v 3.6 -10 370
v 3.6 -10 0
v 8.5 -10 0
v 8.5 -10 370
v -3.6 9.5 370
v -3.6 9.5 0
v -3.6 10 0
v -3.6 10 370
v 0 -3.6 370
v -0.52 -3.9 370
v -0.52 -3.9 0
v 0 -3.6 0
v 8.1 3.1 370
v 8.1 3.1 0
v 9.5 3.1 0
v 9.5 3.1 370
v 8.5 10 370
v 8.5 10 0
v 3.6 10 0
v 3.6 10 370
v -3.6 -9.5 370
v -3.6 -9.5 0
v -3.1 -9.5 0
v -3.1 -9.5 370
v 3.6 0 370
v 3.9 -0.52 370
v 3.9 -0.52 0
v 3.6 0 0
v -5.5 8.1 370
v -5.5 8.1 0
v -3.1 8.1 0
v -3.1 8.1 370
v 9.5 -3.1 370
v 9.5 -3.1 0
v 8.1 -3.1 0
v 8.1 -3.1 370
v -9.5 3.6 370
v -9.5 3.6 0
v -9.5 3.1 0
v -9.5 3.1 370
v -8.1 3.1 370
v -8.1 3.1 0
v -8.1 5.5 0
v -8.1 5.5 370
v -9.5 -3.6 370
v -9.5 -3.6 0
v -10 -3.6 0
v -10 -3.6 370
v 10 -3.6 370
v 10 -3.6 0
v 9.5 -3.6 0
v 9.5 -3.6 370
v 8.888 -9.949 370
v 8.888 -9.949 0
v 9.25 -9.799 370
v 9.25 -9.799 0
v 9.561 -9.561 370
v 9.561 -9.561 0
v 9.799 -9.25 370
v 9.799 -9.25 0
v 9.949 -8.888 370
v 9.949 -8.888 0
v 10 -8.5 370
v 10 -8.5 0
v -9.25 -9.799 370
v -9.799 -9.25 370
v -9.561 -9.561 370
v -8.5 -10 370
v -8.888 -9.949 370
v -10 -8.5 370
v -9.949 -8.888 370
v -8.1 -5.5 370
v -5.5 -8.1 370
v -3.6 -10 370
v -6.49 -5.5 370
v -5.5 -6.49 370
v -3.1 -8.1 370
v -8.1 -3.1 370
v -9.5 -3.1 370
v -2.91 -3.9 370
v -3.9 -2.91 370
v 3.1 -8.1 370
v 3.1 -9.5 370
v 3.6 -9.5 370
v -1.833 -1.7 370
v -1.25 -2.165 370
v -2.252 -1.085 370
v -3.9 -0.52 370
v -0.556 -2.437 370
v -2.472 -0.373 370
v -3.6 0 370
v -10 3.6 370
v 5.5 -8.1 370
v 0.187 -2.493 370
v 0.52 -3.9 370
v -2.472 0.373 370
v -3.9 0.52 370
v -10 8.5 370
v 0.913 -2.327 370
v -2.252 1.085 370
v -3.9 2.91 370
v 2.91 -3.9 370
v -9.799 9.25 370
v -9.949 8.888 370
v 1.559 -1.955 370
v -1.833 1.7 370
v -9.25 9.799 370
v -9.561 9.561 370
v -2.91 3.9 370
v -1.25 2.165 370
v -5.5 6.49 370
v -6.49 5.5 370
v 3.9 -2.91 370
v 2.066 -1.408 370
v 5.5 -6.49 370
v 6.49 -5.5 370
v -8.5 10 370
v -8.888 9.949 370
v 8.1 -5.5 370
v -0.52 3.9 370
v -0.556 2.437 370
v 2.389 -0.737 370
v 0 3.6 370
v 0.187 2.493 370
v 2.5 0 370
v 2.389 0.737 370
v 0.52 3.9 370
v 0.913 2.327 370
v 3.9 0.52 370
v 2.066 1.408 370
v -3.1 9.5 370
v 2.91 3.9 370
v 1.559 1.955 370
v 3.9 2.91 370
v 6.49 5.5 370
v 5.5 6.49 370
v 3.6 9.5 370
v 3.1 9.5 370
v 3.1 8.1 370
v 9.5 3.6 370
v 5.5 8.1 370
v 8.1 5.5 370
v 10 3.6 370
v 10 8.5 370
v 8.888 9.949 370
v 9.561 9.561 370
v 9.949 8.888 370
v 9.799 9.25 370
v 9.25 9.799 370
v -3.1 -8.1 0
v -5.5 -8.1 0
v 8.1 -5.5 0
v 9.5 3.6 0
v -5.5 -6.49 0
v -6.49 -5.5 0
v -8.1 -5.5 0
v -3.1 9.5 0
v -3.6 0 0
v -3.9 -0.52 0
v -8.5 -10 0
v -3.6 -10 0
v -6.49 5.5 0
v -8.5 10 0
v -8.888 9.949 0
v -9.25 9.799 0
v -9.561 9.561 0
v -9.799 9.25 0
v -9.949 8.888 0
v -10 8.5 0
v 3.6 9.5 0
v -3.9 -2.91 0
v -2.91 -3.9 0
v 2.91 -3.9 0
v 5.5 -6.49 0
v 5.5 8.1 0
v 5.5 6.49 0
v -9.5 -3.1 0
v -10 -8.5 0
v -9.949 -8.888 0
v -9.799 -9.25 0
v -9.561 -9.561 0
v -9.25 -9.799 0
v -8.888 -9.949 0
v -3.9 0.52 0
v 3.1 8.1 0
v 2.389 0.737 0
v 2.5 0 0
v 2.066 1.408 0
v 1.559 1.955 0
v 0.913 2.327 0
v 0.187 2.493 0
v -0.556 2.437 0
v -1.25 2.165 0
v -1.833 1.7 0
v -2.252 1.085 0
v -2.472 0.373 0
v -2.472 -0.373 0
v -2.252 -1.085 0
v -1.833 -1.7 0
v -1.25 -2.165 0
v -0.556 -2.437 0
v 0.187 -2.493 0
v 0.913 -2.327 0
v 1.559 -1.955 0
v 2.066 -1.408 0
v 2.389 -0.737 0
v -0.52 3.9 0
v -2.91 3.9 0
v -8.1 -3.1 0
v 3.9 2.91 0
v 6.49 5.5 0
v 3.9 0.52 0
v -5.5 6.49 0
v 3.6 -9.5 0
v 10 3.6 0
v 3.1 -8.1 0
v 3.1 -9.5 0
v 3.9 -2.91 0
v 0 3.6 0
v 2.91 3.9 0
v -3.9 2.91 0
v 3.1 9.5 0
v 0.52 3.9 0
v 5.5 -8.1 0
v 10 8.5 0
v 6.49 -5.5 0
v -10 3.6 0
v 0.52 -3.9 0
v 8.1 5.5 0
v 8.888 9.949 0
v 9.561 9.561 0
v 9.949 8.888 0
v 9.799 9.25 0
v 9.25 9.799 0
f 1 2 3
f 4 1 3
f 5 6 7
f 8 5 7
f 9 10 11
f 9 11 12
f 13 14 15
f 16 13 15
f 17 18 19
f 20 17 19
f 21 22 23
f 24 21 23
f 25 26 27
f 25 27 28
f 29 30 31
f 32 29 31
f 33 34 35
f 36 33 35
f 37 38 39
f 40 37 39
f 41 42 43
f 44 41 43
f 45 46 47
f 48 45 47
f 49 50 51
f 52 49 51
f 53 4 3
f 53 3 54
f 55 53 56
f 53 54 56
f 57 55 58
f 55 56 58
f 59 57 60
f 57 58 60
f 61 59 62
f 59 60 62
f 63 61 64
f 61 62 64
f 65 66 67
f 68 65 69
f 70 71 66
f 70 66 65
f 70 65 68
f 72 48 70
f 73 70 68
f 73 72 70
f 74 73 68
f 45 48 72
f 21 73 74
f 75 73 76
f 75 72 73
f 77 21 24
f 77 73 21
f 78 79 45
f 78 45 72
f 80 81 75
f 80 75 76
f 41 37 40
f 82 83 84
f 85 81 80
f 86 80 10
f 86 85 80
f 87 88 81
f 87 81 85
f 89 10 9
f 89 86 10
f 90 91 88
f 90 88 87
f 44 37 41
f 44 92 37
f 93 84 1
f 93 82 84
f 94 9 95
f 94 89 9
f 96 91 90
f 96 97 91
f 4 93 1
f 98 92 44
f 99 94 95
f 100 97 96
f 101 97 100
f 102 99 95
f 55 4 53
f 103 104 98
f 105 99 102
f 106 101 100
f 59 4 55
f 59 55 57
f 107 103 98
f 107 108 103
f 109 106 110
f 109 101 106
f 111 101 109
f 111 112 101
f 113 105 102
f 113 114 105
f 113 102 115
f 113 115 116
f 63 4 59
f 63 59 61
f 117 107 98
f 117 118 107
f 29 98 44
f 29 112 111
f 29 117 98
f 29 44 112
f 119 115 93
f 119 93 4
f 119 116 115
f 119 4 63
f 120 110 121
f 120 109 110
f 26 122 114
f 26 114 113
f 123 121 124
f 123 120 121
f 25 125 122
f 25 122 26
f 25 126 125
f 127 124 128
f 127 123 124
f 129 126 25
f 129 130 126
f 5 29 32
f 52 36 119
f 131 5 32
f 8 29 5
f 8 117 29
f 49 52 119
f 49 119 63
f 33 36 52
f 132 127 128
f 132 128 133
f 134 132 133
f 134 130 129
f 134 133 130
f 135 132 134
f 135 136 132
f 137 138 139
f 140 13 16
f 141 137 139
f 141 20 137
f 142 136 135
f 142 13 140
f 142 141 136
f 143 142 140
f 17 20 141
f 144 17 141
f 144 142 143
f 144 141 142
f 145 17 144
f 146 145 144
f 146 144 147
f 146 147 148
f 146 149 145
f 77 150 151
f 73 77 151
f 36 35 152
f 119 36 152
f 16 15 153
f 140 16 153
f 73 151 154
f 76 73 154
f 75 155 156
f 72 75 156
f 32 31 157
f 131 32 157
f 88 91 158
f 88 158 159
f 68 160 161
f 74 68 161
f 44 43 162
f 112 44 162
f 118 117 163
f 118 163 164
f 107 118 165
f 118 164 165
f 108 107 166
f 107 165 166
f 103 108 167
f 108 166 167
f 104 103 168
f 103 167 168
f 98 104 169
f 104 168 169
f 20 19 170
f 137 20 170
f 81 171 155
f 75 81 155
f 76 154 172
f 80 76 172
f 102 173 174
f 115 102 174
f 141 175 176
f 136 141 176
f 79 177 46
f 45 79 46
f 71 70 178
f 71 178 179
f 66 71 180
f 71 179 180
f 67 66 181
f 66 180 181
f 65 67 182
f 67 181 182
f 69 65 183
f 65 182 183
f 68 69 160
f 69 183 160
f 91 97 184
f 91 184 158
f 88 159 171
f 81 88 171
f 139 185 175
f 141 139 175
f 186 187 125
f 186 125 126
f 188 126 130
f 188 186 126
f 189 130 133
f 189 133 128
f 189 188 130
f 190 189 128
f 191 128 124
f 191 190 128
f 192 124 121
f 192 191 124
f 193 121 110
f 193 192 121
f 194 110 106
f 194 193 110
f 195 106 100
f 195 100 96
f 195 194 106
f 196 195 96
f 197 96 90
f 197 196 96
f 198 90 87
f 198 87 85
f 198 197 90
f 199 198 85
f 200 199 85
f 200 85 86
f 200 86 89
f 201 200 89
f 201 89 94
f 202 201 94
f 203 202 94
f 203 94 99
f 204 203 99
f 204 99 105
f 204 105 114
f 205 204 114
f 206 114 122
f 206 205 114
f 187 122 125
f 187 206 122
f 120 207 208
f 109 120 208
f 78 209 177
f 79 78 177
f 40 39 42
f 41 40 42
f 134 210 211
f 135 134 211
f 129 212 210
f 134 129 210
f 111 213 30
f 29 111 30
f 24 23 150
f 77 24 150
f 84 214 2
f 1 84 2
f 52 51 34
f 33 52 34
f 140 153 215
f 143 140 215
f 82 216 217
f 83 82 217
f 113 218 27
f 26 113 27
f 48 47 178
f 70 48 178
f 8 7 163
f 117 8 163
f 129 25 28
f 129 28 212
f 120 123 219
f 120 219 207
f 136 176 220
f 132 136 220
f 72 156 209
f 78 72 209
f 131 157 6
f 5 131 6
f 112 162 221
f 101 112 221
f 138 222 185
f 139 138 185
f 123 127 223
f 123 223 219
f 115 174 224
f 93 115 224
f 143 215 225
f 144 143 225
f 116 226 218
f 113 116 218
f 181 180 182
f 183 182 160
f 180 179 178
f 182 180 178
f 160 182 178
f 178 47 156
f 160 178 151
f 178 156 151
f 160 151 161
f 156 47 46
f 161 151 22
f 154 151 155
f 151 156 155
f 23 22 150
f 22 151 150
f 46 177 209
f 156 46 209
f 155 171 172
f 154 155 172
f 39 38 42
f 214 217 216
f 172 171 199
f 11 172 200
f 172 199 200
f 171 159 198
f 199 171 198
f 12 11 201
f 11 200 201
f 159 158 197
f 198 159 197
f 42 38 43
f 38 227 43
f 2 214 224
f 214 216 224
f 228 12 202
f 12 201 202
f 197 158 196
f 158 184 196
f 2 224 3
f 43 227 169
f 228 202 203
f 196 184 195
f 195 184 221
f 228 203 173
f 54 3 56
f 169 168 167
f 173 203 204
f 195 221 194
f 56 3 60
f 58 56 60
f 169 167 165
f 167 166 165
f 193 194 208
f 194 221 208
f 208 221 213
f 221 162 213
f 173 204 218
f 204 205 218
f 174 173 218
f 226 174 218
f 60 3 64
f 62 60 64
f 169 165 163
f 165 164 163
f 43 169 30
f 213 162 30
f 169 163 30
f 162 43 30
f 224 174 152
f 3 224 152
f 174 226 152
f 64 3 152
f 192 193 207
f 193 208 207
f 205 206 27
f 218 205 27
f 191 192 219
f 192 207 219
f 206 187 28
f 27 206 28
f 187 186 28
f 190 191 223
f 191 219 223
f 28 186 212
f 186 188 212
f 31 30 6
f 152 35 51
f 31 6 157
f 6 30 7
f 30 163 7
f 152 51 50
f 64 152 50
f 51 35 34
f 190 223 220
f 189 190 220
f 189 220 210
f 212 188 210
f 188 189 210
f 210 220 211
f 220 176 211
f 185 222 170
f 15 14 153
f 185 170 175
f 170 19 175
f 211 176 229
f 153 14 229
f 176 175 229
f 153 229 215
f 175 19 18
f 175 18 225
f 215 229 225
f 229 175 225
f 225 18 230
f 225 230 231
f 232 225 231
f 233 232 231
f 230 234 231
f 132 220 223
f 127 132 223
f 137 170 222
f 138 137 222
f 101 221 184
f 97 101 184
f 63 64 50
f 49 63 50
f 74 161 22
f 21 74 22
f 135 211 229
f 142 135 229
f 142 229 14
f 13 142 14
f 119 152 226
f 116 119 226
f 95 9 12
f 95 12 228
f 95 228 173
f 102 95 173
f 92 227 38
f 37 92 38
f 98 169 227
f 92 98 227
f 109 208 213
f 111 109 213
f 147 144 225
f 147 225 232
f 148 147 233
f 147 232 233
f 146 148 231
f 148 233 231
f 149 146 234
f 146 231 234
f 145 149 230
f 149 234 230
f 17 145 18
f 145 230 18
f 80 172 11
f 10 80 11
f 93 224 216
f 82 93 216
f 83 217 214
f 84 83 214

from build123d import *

# Parameters (mm, degrees)
MODEL_R         = 2.5
EXTRUDE_1_DEPTH = 370


with BuildPart() as part:
    # Model → 凸台-拉伸1 (new body)
    with BuildSketch(Plane.XY):
        with BuildLine():
            Line((-3.9, 0.519615242), (-3.6, 0))
            Line((-3.6, 0), (-3.9, -0.519615242))
            Line((-3.9, -0.519615242), (-3.9, -2.910050506))
            Line((-3.9, -2.910050506), (-6.489949494, -5.5))
            Line((-6.489949494, -5.5), (-8.1, -5.5))
            Line((-8.1, -5.5), (-8.1, -3.1))
            Line((-8.1, -3.1), (-9.5, -3.1))
            Line((-9.5, -3.1), (-9.5, -3.6))
            Line((-9.5, -3.6), (-10, -3.6))
            Line((-10, -3.6), (-10, -8.5))
            ThreePointArc((-10, -8.5), (-9.560660172, -9.560660172), (-8.5, -10))
            Line((-8.5, -10), (-3.6, -10))
            Line((-3.6, -10), (-3.6, -9.5))
            Line((-3.6, -9.5), (-3.1, -9.5))
            Line((-3.1, -9.5), (-3.1, -8.1))
            Line((-3.1, -8.1), (-5.5, -8.1))
            Line((-5.5, -8.1), (-5.5, -6.489949494))
            Line((-5.5, -6.489949494), (-2.910050506, -3.9))
            Line((-2.910050506, -3.9), (-0.519615242, -3.9))
            Line((-0.519615242, -3.9), (0, -3.6))
            Line((0, -3.6), (0.519615242, -3.9))
            Line((0.519615242, -3.9), (2.910050506, -3.9))
            Line((2.910050506, -3.9), (5.5, -6.489949494))
            Line((5.5, -6.489949494), (5.5, -8.1))
            Line((5.5, -8.1), (3.1, -8.1))
            Line((3.1, -8.1), (3.1, -9.5))
            Line((3.1, -9.5), (3.6, -9.5))
            Line((3.6, -9.5), (3.6, -10))
            Line((3.6, -10), (8.5, -10))
            ThreePointArc((8.5, -10), (9.560660172, -9.560660172), (10, -8.5))
            Line((10, -8.5), (10, -3.6))
            Line((10, -3.6), (9.5, -3.6))
            Line((9.5, -3.6), (9.5, -3.1))
            Line((9.5, -3.1), (8.1, -3.1))
            Line((8.1, -3.1), (8.1, -5.5))
            Line((8.1, -5.5), (6.489949494, -5.5))
            Line((6.489949494, -5.5), (3.9, -2.910050506))
            Line((3.9, -2.910050506), (3.9, -0.519615242))
            Line((3.9, -0.519615242), (3.6, 0))
            Line((3.6, 0), (3.9, 0.519615242))
            Line((3.9, 0.519615242), (3.9, 2.910050506))
            Line((3.9, 2.910050506), (6.489949494, 5.5))
            Line((6.489949494, 5.5), (8.1, 5.5))
            Line((8.1, 5.5), (8.1, 3.1))
            Line((8.1, 3.1), (9.5, 3.1))
            Line((9.5, 3.1), (9.5, 3.6))
            Line((9.5, 3.6), (10, 3.6))
            Line((10, 3.6), (10, 8.5))
            ThreePointArc((10, 8.5), (9.560660172, 9.560660172), (8.5, 10))
            Line((8.5, 10), (3.6, 10))
            Line((3.6, 10), (3.6, 9.5))
            Line((3.6, 9.5), (3.1, 9.5))
            Line((3.1, 9.5), (3.1, 8.1))
            Line((3.1, 8.1), (5.5, 8.1))
            Line((5.5, 8.1), (5.5, 6.489949494))
            Line((5.5, 6.489949494), (2.910050506, 3.9))
            Line((2.910050506, 3.9), (0.519615242, 3.9))
            Line((0.519615242, 3.9), (0, 3.6))
            Line((0, 3.6), (-0.519615242, 3.9))
            Line((-0.519615242, 3.9), (-2.910050506, 3.9))
            Line((-2.910050506, 3.9), (-5.5, 6.489949494))
            Line((-5.5, 6.489949494), (-5.5, 8.1))
            Line((-5.5, 8.1), (-3.1, 8.1))
            Line((-3.1, 8.1), (-3.1, 9.5))
            Line((-3.1, 9.5), (-3.6, 9.5))
            Line((-3.6, 9.5), (-3.6, 10))
            Line((-3.6, 10), (-8.5, 10))
            ThreePointArc((-8.5, 10), (-9.560660172, 9.560660172), (-10, 8.5))
            Line((-10, 8.5), (-10, 3.6))
            Line((-10, 3.6), (-9.5, 3.6))
            Line((-9.5, 3.6), (-9.5, 3.1))
            Line((-9.5, 3.1), (-8.1, 3.1))
            Line((-8.1, 3.1), (-8.1, 5.5))
            Line((-8.1, 5.5), (-6.489949494, 5.5))
            Line((-6.489949494, 5.5), (-3.9, 2.910050506))
            Line((-3.9, 2.910050506), (-3.9, 0.519615242))
        make_face()
        Circle(MODEL_R, mode=Mode.SUBTRACT)
    extrude(amount=EXTRUDE_1_DEPTH)


solid = part.part
